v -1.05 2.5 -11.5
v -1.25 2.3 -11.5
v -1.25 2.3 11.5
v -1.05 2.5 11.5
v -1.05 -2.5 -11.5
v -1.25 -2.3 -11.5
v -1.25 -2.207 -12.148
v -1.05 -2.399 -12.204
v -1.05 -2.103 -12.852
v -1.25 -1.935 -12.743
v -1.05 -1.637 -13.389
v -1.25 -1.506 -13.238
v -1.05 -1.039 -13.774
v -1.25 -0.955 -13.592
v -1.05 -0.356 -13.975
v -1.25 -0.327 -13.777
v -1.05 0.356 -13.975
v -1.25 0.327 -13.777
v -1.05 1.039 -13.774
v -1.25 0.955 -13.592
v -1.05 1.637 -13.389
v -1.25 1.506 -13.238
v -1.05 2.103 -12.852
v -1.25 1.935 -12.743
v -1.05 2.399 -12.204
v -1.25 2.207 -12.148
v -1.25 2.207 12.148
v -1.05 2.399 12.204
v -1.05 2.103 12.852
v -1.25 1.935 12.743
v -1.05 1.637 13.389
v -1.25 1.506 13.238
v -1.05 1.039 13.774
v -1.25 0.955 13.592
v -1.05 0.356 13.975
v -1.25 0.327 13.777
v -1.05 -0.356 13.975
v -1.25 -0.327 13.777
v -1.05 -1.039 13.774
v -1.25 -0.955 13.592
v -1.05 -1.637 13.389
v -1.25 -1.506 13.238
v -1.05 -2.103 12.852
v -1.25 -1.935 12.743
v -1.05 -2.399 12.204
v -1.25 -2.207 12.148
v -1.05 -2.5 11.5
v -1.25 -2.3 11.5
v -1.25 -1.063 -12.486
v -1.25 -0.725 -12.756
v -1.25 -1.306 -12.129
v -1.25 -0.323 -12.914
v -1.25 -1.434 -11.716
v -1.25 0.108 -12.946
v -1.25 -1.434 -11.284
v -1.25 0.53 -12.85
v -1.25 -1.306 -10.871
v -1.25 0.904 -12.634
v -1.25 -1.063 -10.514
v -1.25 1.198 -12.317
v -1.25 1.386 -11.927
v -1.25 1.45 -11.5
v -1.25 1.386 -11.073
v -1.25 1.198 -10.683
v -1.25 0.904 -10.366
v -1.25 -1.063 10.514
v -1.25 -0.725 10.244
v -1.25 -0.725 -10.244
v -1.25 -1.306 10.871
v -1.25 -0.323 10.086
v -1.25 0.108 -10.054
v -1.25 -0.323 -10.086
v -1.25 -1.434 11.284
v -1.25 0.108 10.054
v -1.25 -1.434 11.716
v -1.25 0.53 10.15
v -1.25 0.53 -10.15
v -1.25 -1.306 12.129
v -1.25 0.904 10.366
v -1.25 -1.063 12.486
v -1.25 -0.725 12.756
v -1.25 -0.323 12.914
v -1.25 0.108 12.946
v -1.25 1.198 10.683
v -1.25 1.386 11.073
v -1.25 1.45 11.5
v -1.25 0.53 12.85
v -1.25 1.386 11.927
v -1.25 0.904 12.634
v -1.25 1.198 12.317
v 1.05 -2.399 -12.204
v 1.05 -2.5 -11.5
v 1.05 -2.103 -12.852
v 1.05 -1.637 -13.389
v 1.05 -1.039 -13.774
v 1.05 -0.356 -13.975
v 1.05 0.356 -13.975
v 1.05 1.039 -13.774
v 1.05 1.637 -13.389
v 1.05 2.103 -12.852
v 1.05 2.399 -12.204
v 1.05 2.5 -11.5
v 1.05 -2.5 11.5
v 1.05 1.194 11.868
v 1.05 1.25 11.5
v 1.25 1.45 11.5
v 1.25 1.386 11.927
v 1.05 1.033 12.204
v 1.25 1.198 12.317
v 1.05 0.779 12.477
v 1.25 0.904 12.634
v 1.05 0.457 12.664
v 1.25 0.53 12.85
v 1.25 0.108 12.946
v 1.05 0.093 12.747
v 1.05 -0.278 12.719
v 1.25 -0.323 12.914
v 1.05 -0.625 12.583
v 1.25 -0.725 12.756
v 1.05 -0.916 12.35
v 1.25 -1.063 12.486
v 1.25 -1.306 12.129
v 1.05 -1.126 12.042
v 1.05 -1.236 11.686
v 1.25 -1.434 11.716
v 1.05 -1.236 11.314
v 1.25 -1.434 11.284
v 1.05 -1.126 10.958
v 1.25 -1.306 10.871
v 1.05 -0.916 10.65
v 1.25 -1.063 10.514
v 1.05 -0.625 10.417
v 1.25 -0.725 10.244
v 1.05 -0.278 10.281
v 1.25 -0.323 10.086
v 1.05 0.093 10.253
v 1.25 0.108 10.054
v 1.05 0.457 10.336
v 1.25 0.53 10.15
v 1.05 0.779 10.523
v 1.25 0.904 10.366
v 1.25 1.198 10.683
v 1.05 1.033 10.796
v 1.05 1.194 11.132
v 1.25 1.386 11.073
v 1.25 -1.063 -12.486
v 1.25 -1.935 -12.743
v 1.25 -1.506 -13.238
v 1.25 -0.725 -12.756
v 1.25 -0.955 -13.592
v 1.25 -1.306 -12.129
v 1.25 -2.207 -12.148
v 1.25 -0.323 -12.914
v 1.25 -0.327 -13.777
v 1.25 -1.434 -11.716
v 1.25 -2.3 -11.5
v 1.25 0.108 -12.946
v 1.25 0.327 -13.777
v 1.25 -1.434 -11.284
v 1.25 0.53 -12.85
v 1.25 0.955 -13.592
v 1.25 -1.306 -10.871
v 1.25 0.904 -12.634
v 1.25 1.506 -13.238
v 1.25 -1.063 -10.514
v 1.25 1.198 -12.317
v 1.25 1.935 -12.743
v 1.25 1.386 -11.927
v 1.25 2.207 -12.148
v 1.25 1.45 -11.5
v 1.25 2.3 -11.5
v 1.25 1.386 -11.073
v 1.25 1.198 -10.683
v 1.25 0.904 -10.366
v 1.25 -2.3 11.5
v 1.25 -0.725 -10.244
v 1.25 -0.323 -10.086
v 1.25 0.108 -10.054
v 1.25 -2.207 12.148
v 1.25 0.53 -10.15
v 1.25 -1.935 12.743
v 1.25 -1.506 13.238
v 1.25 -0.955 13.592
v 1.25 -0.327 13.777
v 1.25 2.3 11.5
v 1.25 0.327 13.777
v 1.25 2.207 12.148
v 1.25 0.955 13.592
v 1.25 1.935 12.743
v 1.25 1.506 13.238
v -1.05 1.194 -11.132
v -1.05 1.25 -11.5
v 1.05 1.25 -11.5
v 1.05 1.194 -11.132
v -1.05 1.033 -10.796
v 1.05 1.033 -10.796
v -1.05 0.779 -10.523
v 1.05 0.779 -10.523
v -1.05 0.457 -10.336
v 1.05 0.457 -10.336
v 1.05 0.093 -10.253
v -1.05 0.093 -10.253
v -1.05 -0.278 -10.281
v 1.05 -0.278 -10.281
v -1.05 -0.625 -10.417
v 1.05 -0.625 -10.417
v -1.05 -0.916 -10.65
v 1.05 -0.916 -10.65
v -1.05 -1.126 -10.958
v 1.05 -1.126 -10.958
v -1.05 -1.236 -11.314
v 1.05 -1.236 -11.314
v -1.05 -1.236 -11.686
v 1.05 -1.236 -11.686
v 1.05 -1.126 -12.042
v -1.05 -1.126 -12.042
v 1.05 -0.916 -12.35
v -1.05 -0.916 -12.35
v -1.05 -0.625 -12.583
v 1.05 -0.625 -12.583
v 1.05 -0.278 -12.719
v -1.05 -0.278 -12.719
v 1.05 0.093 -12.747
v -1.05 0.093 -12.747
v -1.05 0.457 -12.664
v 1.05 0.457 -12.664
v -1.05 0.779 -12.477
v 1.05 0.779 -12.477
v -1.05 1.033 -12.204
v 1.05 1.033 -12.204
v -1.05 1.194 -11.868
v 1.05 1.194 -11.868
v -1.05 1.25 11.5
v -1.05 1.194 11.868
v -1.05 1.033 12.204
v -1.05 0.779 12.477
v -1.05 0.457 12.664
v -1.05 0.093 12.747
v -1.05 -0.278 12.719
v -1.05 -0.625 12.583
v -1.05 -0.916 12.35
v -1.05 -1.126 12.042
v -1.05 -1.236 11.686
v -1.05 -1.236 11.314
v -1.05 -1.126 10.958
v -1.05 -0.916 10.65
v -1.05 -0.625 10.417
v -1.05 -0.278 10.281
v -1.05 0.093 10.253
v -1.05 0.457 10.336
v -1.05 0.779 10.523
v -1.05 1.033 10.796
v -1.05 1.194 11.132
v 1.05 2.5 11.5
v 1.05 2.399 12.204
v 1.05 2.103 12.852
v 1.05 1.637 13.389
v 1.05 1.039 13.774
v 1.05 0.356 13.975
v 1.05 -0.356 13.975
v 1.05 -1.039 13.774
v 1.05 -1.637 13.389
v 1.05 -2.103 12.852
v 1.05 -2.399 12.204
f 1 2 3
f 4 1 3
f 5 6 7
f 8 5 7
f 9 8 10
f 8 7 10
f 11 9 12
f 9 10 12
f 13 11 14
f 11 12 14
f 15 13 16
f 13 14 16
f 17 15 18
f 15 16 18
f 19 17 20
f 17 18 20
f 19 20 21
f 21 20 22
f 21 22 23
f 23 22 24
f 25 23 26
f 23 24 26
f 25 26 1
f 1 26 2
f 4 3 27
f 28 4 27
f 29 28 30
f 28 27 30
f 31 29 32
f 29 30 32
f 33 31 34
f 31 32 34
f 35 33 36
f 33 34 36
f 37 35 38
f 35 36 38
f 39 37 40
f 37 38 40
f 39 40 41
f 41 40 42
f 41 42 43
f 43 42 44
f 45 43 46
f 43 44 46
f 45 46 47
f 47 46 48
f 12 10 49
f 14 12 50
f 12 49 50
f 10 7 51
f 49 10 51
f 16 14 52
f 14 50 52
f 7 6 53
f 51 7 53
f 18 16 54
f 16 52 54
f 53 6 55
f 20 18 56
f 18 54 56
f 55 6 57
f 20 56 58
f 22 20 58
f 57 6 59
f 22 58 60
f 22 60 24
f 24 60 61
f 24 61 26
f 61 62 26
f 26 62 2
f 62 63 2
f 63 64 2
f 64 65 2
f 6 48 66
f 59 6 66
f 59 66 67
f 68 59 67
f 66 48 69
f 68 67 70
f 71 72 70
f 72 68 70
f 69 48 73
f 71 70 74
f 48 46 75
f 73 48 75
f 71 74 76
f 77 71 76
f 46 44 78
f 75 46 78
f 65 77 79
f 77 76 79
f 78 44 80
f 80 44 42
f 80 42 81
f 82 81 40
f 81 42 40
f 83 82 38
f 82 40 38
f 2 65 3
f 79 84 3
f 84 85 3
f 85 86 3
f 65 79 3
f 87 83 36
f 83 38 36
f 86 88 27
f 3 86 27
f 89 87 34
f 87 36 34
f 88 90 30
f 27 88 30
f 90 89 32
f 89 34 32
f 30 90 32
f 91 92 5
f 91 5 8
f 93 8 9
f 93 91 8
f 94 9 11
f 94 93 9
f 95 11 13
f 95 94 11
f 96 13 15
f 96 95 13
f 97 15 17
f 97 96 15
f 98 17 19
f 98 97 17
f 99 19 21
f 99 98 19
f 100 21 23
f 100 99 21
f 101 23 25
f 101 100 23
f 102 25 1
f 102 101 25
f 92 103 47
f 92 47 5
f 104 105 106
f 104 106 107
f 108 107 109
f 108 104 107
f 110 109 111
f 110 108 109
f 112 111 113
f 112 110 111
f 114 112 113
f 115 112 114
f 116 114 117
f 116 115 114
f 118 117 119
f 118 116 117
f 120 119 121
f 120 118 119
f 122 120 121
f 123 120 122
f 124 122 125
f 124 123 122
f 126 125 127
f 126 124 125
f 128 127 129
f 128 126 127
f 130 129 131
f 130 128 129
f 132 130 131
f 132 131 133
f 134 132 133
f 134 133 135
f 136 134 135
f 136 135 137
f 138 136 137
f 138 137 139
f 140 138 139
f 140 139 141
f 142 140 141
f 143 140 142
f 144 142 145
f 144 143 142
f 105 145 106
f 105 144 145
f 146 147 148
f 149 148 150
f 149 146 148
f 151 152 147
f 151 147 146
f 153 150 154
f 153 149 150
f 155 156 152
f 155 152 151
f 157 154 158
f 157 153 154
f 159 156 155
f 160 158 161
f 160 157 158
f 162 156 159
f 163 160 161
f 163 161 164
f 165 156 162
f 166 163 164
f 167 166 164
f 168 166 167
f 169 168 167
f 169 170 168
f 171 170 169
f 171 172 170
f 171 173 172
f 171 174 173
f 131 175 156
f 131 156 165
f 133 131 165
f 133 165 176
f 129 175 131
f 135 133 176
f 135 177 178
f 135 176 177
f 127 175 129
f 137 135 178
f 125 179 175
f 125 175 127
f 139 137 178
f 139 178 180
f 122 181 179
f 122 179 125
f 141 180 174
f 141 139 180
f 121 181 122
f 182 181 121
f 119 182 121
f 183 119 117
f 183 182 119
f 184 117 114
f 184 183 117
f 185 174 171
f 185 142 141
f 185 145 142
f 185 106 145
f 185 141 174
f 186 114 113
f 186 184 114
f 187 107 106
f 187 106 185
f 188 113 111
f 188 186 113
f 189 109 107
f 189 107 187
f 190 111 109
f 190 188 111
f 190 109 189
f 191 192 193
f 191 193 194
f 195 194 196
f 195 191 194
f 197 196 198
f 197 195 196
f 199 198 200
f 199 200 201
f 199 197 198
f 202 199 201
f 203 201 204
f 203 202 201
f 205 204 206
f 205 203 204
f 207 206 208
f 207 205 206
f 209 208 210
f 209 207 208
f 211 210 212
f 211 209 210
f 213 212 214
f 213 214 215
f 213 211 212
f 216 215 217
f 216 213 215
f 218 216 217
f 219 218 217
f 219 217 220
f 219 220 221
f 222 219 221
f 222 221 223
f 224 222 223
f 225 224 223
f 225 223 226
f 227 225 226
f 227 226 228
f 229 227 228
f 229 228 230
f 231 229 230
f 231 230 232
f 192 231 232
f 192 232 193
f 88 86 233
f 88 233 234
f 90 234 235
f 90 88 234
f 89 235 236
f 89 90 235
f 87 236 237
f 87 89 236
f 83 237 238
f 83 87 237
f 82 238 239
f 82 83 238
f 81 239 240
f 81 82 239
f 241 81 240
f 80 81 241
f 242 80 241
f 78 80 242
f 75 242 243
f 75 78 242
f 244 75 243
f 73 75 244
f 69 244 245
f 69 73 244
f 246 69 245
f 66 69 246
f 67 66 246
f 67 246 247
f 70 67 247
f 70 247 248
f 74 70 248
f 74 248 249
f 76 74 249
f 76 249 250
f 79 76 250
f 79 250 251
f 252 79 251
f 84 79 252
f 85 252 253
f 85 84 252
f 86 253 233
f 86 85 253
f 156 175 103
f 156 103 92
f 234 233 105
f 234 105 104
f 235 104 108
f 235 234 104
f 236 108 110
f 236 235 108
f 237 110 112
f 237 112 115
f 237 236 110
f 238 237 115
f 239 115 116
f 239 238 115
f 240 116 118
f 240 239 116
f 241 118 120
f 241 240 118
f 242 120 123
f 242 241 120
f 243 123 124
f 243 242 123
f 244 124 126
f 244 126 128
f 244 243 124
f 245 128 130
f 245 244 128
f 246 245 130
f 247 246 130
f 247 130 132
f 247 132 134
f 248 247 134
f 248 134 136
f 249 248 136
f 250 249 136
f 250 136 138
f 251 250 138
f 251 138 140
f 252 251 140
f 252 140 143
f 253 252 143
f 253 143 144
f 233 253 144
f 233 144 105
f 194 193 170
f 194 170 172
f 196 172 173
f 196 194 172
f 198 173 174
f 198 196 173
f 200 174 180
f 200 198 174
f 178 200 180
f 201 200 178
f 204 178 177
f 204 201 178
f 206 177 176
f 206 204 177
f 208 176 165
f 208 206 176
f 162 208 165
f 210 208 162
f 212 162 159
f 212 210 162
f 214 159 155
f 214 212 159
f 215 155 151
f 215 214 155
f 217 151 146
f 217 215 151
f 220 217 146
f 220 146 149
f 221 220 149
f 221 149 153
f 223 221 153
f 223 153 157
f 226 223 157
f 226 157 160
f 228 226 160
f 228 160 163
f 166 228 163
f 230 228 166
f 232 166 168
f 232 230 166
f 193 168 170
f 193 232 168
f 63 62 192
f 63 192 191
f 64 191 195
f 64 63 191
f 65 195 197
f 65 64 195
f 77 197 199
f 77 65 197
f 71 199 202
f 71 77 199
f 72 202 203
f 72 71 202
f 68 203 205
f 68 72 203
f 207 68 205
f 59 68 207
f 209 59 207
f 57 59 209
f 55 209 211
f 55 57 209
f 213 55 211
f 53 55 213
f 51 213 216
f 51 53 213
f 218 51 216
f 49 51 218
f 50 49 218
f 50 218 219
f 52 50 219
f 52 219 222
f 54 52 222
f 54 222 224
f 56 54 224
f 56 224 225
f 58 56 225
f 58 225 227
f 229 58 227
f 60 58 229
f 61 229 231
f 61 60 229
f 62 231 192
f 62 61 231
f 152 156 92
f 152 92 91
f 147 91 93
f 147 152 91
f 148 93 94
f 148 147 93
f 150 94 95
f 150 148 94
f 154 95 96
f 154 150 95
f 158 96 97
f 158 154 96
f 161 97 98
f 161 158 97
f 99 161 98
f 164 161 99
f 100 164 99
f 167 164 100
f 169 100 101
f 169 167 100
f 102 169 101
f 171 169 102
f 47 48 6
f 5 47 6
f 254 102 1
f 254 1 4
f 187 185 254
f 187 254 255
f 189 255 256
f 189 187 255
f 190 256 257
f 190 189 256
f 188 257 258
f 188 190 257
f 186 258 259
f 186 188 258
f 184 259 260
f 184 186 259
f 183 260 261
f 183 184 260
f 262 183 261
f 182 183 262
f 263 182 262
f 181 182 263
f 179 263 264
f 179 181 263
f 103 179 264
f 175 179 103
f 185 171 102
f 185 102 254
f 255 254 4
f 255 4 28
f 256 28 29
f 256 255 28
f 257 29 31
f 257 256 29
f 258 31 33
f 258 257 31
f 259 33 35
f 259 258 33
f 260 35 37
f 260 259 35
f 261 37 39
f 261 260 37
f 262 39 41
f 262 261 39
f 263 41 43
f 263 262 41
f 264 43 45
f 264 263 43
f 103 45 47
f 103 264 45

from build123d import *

# Parameters (mm, degrees)
F0_R     = 1.25
F1_DEPTH = 1.25
F2_SIZE  = 0.2


with BuildPart() as f1:
    # F0 (on Right) → F1 (new body, symmetric)
    with BuildSketch(Plane.YZ):
        with BuildLine():
            Line((2.5, -11.5), (2.5, 11.5))
            ThreePointArc((2.5, 11.5), (0, 14), (-2.5, 11.5))
            Line((-2.5, 11.5), (-2.5, -11.5))
            ThreePointArc((-2.5, -11.5), (0, -14), (2.5, -11.5))
        make_face()
        with Locations((0, -11.5)):
            Circle(F0_R, mode=Mode.SUBTRACT)
        with Locations((0, 11.5)):
            Circle(F0_R, mode=Mode.SUBTRACT)
    extrude(amount=F1_DEPTH, both=True)

    # F2
    f2_edges = [f1.edges().sort_by_distance(p)[0] for p in [
        (1.25, 2.5, 0),
        (1.25, 0, 14),
        (1.25, -2.5, 0),
        (1.25, 0, -14),
        (-1.25, 0, 14),
        (-1.25, 2.5, 0),
        (-1.25, -2.5, 0),
        (-1.25, 0, -14),
        (-1.25, -1.25, 11.5),
        (-1.25, -1.25, -11.5),
        (1.25, -1.25, 11.5),
        (1.25, -1.25, -11.5),
    ]]
    chamfer(f2_edges, length=F2_SIZE)


solid = f1.part
